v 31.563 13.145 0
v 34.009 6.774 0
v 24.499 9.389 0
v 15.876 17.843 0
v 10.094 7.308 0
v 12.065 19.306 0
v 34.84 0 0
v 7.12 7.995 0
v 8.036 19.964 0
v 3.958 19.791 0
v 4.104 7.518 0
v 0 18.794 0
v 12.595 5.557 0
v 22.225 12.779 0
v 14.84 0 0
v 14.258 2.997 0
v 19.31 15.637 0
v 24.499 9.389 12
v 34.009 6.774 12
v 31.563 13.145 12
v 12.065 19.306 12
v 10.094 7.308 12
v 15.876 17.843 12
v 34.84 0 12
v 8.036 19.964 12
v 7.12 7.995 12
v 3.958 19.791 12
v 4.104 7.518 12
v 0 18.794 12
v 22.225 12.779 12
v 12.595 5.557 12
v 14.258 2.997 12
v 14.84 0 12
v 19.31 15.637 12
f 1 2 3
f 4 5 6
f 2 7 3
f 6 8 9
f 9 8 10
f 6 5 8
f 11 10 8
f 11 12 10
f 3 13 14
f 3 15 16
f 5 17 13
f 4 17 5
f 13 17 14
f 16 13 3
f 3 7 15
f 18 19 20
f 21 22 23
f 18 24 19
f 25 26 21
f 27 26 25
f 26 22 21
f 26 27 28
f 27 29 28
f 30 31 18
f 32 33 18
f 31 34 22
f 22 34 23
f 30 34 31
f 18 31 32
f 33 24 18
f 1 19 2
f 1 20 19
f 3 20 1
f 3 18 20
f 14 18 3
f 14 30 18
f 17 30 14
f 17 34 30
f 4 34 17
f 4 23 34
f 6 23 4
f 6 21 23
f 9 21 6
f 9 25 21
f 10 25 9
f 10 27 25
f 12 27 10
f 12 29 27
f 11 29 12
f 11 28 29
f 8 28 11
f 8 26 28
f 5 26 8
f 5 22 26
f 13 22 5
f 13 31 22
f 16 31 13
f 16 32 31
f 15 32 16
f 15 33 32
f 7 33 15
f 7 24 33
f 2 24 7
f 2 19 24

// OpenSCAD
$fn = 32;

// ----------------------------------------------------------------------
// Arc stop: segment, 12 mm thick
// ----------------------------------------------------------------------

// --- parameters (mm) ---
profile_height = 12;      // extrusion height
profile_points = 17;      // points of the closed outline

profile = [[34.84, 0], [34.009, 6.774], [31.563, 13.145], [24.499, 9.389], [22.225, 12.779], [19.31, 15.637], [15.876, 17.843], [12.065, 19.306], [8.036, 19.964], [3.958, 19.791], [0, 18.794], [4.104, 7.518], [7.12, 7.995], [10.094, 7.308], [12.595, 5.557], [14.258, 2.997], [14.84, 0]];  // single closed polygon, 17 points, counter clockwise

// --- the one profile operation ---
linear_extrude(height = profile_height) polygon(points = profile);
